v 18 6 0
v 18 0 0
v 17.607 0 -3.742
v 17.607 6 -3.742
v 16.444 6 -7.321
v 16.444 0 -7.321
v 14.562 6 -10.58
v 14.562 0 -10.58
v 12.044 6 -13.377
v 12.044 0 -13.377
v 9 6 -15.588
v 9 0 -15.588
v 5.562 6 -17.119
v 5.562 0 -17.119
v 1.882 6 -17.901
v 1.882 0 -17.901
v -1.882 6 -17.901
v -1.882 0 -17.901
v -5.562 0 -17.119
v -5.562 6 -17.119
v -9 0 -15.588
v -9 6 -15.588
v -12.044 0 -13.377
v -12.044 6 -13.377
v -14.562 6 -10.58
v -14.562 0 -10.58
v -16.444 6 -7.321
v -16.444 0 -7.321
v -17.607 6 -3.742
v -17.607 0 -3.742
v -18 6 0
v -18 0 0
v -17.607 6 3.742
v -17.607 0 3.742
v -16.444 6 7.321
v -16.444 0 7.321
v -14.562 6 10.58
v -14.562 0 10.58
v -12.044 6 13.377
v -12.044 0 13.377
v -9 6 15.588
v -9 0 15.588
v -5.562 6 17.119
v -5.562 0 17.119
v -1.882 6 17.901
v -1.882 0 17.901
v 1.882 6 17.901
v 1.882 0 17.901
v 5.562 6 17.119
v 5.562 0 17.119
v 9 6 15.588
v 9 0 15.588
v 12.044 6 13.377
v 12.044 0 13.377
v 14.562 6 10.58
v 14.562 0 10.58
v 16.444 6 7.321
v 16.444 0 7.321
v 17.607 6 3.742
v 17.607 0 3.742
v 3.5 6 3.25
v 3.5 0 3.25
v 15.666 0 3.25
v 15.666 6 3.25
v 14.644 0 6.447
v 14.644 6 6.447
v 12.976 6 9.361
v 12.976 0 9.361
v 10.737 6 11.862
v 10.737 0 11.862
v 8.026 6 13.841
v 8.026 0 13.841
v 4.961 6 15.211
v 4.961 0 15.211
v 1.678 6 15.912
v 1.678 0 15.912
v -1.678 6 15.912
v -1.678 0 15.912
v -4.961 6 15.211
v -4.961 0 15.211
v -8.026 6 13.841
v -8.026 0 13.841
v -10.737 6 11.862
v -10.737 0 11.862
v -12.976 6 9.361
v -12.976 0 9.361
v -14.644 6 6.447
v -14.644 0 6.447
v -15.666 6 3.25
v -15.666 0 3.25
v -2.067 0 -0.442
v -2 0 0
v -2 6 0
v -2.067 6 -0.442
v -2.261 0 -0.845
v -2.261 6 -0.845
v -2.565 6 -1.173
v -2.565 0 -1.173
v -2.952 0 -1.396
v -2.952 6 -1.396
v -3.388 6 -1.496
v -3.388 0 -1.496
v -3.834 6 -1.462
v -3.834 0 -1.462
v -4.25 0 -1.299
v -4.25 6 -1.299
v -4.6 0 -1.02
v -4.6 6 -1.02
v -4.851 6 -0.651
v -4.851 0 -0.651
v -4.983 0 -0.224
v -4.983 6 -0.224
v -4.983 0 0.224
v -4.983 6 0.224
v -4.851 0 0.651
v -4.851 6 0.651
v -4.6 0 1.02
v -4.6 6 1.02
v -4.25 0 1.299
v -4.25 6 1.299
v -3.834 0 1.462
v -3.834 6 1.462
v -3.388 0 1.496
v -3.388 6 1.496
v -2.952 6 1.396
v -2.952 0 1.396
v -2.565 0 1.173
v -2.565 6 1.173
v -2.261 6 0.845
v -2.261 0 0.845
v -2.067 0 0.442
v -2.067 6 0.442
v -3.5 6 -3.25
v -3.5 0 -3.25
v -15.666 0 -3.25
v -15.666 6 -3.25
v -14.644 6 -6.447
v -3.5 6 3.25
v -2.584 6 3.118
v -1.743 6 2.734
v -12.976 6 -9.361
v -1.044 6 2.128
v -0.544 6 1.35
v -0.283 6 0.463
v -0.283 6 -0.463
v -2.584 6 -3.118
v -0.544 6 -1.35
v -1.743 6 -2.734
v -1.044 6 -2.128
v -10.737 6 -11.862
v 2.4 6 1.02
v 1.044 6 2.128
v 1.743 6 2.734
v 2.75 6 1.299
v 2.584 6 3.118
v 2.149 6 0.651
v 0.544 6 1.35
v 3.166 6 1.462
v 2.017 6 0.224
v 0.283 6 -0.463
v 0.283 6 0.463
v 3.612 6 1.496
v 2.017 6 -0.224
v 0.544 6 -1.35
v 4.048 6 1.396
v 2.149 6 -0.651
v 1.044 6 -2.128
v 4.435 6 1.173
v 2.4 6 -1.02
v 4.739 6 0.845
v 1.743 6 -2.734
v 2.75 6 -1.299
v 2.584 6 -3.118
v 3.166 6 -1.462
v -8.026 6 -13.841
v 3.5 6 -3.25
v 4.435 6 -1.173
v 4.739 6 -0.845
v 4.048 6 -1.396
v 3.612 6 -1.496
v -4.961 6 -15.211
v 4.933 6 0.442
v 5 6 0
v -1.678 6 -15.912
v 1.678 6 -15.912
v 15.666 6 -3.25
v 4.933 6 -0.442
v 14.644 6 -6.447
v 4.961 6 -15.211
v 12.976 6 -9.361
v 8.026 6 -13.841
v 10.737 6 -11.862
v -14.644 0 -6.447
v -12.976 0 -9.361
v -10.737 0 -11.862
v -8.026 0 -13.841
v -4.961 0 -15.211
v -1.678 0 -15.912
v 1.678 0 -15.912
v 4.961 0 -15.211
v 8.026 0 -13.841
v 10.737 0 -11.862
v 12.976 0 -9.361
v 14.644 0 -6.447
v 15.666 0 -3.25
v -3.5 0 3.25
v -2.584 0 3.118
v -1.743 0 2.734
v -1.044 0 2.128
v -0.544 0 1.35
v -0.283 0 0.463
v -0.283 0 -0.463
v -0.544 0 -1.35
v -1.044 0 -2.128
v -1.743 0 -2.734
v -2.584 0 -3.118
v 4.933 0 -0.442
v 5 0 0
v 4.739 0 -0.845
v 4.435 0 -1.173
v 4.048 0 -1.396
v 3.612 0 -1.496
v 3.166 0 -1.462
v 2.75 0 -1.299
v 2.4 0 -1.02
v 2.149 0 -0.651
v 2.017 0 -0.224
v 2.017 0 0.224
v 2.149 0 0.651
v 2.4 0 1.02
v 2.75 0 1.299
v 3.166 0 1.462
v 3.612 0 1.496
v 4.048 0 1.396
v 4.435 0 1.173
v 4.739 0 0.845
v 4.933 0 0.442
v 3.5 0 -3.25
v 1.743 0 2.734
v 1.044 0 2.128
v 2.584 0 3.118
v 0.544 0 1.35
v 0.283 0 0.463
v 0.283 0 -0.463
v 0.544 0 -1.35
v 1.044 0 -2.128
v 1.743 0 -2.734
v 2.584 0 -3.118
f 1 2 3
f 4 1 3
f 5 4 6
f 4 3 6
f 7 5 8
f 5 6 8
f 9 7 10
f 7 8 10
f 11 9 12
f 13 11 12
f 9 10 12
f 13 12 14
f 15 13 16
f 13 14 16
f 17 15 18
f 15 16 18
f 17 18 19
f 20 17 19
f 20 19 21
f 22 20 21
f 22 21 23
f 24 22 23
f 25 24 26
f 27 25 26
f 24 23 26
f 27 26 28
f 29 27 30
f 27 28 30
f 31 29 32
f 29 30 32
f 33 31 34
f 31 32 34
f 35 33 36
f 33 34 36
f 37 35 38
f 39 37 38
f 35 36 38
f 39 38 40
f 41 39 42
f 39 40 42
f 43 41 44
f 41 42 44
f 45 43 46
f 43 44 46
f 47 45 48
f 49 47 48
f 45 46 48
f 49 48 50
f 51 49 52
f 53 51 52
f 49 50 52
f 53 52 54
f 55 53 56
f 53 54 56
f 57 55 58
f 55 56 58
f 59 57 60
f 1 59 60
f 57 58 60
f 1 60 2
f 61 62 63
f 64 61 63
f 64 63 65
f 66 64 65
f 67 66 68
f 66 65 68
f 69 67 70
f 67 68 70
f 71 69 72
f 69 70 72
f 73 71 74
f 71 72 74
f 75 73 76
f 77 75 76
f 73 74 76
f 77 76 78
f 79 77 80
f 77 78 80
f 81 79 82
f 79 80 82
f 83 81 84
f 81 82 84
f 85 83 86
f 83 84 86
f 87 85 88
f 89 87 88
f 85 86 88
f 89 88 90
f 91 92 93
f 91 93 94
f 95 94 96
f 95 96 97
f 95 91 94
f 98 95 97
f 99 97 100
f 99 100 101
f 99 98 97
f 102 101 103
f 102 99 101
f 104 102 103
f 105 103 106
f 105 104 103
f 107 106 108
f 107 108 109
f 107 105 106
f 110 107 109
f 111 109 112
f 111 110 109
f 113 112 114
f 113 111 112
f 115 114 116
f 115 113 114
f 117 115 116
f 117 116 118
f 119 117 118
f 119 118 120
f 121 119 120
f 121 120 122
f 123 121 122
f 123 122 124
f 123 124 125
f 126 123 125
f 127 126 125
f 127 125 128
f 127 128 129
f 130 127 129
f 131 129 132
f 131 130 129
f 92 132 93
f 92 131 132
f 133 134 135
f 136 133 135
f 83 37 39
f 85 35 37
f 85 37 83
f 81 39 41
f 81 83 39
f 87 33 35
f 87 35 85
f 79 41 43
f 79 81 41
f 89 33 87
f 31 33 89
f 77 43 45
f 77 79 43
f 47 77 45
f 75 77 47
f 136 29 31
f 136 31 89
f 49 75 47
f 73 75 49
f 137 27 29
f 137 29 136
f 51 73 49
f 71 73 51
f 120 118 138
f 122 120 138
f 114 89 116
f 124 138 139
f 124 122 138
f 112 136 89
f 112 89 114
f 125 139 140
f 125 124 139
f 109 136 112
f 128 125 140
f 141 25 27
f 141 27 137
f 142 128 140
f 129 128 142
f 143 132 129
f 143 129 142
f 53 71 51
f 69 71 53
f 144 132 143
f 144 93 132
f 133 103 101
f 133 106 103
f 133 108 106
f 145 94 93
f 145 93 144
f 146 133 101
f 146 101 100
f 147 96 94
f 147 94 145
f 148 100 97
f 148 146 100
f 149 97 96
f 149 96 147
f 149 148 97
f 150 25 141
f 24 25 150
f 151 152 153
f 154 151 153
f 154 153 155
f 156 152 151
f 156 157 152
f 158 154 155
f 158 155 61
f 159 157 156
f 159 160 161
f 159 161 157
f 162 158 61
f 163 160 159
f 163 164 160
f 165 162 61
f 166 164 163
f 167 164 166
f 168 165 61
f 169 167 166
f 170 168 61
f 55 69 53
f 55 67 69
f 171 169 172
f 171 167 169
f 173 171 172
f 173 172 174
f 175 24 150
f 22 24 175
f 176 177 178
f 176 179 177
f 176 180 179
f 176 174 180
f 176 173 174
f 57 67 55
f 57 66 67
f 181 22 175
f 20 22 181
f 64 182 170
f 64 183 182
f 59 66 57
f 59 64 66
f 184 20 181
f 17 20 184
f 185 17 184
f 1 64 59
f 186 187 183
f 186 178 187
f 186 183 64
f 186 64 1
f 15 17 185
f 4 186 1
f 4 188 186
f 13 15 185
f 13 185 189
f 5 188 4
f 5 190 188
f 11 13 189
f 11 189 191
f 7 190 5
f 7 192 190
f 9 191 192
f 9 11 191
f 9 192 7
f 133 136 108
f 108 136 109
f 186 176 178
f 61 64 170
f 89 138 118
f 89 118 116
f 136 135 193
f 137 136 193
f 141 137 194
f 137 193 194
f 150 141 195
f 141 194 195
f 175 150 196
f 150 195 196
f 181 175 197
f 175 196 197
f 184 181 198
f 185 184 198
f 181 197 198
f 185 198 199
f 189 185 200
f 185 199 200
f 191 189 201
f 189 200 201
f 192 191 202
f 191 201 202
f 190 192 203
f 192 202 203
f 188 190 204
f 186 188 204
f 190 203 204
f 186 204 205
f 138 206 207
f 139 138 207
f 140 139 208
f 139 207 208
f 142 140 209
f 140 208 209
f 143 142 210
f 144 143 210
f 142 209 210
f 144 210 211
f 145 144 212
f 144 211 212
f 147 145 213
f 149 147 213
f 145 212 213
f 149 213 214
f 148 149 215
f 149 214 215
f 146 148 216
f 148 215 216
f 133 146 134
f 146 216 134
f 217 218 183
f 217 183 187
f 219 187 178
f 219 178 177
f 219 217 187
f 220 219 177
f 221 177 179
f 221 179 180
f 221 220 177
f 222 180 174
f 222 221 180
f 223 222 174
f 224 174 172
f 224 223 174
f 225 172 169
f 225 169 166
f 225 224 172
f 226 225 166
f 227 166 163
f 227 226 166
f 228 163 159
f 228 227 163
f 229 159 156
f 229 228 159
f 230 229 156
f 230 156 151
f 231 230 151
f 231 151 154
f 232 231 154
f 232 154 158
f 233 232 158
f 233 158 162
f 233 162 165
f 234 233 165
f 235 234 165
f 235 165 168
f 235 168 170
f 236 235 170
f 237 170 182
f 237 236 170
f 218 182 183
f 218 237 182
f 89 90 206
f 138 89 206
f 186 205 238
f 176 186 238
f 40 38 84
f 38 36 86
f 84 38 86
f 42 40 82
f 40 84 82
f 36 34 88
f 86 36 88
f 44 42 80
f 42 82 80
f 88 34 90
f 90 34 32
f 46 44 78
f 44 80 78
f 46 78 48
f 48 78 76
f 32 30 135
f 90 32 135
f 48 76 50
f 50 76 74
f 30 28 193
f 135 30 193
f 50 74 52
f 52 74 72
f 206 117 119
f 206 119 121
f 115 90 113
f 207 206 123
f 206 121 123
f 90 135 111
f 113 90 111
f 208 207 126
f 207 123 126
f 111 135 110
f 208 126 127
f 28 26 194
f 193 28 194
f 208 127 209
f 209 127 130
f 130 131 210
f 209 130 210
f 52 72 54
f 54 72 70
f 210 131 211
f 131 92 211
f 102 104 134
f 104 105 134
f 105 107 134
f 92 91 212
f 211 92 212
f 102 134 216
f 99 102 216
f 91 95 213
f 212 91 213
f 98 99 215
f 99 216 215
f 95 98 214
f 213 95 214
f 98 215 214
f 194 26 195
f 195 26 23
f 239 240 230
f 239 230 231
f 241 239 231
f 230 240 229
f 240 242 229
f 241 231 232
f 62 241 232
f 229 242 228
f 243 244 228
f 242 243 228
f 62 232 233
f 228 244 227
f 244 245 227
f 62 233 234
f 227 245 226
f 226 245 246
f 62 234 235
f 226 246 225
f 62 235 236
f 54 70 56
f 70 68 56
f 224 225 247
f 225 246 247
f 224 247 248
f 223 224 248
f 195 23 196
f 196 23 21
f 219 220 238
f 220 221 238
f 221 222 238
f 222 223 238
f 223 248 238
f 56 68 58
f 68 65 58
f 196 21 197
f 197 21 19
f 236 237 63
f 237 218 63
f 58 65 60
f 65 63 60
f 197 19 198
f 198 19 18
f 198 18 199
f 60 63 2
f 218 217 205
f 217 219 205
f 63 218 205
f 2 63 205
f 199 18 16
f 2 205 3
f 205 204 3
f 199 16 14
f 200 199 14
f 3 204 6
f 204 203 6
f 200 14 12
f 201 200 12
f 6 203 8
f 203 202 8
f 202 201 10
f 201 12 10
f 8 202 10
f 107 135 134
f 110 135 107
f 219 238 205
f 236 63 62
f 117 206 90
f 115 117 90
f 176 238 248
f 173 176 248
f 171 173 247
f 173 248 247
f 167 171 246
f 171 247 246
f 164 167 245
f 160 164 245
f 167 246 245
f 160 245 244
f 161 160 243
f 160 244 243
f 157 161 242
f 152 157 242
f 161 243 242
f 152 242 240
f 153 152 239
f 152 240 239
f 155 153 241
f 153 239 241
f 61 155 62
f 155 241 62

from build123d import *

# Parameters (mm, degrees)
ESQUISSE1_R        = 18
ESQUISSE1_R_2      = 1.5
BOSS_EXTRU_1_DEPTH = 6


with BuildPart() as part:
    # Esquisse1 → Boss.-Extru.1 (new body)
    with BuildSketch(Plane(origin=(0, 0, 0), x_dir=(1, 0, 0), z_dir=(0, 1, 0))):
        Circle(ESQUISSE1_R)
        with Locations((-3.5, 0)):
            Circle(ESQUISSE1_R_2, mode=Mode.SUBTRACT)
        with Locations((3.5, 0)):
            Circle(ESQUISSE1_R_2, mode=Mode.SUBTRACT)
        with BuildLine():
            Line((-3.5, 3.25), (-15.666445034, 3.25))
            ThreePointArc((-15.666445034, 3.25), (0, 16), (15.666445034, 3.25))
            Line((15.666445034, 3.25), (3.5, 3.25))
            ThreePointArc((3.5, 3.25), (0.25, 0), (3.5, -3.25))
            Line((3.5, -3.25), (15.666445034, -3.25))
            ThreePointArc((15.666445034, -3.25), (0, -16), (-15.666445034, -3.25))
            Line((-15.666445034, -3.25), (-3.5, -3.25))
            ThreePointArc((-3.5, -3.25), (-0.25, 0), (-3.5, 3.25))
        make_face(mode=Mode.SUBTRACT)
    extrude(amount=BOSS_EXTRU_1_DEPTH)


solid = part.part
